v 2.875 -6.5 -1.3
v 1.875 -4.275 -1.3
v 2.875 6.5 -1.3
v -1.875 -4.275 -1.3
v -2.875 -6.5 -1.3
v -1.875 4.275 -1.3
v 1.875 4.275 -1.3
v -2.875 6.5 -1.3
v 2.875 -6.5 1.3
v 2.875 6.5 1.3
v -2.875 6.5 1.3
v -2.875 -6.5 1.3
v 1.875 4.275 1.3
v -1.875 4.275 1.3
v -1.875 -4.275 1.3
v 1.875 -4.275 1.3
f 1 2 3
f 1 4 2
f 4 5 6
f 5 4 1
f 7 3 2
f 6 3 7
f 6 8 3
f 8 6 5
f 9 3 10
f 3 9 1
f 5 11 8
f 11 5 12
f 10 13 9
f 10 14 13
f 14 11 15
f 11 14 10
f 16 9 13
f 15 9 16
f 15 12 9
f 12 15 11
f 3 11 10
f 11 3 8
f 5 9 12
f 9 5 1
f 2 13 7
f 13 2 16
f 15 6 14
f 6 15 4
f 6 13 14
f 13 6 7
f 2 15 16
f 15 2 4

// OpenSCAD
innerHeight =  3.75;
innerWidth  =  8.55;
outerWidth  = 13.00;
outerHeight =  5.75;

depth = 2.6;
// translate([32, 0, 0])

rotate([0, 90, 0])
difference() {
	cube([depth, outerWidth, outerHeight], center=true);
	scale([1.1, 1, 1])
	cube([depth, innerWidth, innerHeight], center=true);
}
